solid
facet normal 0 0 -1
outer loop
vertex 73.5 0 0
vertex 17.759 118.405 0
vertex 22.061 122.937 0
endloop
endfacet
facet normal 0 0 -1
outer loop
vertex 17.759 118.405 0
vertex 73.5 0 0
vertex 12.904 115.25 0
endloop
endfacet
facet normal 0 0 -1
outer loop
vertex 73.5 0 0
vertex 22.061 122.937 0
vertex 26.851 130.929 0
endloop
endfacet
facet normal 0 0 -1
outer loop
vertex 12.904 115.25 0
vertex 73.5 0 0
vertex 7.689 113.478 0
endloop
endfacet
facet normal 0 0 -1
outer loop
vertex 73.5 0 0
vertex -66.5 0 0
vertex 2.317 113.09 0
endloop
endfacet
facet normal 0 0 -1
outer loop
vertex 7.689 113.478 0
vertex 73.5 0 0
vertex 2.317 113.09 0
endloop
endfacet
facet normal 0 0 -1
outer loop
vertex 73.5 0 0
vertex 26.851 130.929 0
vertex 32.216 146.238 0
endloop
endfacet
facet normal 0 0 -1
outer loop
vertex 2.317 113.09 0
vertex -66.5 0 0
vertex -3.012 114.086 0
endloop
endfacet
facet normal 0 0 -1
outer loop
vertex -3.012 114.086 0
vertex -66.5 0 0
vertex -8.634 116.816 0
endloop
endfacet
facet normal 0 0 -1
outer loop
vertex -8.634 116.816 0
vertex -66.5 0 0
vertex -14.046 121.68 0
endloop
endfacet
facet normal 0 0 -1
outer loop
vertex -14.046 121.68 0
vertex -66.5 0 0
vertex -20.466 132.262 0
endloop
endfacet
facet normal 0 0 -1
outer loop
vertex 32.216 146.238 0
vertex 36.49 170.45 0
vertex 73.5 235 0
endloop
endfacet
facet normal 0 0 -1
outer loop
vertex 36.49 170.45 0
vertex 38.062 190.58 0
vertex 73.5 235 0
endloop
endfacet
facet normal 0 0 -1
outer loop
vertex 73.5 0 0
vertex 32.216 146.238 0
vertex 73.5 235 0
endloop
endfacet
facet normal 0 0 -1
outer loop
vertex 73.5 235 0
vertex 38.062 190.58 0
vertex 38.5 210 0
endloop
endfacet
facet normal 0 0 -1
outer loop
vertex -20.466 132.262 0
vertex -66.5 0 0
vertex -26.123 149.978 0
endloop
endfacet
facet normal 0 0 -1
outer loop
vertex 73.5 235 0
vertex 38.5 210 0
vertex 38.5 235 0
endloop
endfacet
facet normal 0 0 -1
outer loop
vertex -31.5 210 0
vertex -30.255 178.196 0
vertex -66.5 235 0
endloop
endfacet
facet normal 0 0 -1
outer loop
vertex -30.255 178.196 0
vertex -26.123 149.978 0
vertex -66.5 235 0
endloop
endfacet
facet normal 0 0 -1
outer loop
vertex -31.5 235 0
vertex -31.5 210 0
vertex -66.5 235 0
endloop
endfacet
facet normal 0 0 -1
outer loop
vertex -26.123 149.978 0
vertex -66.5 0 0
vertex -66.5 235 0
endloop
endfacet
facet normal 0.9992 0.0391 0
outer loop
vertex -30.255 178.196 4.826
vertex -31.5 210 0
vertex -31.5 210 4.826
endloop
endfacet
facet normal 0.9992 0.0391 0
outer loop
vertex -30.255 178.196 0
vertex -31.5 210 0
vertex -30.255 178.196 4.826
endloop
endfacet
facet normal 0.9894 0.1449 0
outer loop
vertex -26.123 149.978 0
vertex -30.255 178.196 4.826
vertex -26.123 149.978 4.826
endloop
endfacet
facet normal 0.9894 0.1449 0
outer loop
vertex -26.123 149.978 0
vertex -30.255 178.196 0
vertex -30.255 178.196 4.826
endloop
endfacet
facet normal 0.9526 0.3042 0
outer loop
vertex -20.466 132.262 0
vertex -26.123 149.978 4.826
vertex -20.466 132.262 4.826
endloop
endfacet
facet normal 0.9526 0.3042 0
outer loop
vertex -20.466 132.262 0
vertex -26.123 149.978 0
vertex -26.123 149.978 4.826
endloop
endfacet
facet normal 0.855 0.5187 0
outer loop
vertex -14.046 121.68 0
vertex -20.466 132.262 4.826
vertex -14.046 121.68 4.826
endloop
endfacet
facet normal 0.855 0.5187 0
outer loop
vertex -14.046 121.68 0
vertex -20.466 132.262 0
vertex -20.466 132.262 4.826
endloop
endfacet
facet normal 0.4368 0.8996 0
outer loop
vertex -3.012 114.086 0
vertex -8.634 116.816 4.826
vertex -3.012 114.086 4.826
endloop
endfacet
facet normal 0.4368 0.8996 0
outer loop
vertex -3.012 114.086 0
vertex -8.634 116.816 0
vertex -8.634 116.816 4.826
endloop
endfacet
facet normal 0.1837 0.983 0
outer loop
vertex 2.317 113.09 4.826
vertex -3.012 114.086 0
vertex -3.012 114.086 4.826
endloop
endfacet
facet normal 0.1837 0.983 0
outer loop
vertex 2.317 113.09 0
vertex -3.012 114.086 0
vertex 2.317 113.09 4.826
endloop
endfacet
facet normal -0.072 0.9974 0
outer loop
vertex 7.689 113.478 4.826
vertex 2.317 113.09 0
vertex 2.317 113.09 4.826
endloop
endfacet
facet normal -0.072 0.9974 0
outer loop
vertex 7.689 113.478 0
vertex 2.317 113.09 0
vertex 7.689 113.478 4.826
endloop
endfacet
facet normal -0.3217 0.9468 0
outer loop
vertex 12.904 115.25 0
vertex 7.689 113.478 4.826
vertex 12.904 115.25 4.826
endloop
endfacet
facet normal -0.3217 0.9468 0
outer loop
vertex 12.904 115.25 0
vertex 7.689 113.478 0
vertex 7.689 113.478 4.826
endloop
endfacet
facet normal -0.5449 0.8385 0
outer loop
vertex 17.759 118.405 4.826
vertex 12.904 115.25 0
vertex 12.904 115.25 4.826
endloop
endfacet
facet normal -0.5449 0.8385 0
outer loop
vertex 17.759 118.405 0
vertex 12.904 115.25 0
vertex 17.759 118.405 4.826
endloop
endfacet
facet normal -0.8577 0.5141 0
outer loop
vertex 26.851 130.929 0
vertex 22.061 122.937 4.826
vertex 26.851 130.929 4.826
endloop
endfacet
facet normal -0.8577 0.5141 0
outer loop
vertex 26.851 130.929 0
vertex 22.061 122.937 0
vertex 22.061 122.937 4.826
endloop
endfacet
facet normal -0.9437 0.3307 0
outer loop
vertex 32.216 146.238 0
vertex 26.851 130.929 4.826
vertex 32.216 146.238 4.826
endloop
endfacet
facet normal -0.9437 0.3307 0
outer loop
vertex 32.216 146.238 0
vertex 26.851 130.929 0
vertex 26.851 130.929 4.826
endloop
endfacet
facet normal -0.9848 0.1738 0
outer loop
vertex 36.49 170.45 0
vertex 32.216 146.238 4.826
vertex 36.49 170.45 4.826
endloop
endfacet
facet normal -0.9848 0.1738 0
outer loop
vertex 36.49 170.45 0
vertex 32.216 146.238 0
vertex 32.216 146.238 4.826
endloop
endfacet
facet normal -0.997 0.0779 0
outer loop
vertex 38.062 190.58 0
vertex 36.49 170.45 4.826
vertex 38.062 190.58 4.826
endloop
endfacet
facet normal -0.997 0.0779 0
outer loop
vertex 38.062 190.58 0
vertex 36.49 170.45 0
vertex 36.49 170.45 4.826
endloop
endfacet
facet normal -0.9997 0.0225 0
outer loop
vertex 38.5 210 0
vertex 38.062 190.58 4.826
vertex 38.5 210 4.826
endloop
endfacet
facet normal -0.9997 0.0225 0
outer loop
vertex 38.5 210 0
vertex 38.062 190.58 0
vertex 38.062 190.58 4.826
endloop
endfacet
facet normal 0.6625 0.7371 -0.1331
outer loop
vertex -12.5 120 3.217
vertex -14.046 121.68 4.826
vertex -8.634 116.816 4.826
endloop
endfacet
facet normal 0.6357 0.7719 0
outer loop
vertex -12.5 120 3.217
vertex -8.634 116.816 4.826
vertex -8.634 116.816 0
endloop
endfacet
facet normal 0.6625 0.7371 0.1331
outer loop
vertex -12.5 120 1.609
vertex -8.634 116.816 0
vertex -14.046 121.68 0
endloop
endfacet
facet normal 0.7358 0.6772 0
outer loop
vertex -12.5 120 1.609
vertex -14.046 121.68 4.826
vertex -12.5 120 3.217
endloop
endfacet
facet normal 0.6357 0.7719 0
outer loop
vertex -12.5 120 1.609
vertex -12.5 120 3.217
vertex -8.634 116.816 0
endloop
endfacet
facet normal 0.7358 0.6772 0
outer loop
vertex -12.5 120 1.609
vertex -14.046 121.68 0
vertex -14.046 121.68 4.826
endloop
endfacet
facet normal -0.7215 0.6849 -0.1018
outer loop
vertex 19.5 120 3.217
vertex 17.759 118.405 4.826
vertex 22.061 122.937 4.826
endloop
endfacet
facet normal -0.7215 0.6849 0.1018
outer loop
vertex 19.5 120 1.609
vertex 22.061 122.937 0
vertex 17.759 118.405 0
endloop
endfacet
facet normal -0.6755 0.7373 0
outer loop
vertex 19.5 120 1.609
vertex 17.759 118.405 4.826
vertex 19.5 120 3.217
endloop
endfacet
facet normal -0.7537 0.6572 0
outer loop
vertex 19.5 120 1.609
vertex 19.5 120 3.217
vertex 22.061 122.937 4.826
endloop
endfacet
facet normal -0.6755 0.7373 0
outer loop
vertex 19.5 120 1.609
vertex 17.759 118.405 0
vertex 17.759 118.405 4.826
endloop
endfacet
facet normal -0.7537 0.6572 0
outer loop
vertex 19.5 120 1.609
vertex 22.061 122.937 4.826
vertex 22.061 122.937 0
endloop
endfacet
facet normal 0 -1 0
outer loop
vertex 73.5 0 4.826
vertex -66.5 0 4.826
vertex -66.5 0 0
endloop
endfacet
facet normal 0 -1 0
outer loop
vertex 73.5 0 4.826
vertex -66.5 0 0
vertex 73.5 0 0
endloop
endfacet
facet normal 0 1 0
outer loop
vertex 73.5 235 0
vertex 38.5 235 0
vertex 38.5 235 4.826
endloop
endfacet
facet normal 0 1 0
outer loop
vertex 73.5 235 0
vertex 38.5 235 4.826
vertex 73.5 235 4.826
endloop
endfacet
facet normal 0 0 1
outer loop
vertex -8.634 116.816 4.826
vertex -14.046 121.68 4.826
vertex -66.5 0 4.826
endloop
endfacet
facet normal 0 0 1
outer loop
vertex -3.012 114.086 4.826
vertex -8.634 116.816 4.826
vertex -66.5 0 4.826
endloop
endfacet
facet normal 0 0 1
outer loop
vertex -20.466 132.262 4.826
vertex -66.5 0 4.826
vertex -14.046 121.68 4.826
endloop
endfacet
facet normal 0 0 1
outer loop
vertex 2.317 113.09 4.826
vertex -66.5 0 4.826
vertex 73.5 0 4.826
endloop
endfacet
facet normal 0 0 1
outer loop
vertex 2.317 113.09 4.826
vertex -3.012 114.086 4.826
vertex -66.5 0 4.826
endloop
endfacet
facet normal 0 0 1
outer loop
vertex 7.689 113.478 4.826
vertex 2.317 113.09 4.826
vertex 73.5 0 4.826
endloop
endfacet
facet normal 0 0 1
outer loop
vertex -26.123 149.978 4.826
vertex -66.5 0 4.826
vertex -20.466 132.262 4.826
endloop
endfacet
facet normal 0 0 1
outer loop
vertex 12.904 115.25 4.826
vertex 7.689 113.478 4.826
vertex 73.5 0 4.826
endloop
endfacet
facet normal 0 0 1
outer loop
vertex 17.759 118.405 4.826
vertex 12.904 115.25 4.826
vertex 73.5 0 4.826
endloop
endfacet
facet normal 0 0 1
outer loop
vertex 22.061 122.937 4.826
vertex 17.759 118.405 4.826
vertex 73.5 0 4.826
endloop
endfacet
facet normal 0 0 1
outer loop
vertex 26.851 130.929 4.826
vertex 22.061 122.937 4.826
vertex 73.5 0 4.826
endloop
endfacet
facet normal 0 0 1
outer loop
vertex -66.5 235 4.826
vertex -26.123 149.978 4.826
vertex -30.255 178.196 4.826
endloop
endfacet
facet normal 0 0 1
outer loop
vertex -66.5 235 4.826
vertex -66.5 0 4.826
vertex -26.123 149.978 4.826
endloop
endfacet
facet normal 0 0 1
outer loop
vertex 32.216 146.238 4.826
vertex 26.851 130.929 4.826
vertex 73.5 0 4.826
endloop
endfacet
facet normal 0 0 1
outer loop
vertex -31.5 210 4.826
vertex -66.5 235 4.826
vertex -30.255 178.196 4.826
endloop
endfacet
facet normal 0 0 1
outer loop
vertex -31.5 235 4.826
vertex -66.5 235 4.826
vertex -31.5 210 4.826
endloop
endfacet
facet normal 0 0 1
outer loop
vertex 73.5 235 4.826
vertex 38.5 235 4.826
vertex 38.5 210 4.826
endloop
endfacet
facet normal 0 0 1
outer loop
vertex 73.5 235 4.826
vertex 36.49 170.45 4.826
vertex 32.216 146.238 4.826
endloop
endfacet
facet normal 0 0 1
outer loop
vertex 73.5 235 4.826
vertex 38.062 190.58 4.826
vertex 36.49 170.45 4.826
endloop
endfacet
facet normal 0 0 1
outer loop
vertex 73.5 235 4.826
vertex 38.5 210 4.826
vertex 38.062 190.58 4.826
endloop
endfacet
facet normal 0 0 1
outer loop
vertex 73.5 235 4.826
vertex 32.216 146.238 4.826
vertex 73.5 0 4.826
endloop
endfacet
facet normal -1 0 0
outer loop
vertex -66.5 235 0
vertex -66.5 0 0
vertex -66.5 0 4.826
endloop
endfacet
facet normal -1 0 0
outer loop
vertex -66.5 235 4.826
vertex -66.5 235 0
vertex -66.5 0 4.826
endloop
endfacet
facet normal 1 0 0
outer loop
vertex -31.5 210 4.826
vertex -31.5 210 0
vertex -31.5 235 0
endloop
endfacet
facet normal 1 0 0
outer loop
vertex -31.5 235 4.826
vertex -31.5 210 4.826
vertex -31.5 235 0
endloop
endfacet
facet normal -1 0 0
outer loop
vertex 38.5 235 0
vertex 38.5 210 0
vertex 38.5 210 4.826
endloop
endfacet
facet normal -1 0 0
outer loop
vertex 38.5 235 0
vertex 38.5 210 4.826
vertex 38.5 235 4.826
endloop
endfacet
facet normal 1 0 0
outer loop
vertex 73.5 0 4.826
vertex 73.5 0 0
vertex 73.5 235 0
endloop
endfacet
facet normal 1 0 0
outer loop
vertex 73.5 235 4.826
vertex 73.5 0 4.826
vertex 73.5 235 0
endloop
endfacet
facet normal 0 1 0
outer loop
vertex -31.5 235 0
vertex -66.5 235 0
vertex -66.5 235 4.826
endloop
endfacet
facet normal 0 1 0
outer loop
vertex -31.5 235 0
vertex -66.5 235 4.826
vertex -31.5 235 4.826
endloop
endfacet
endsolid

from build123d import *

# Parameters (mm, degrees)
F0_W      = 140
F0_H      = 110
F0_W_2    = 35
F0_H_2    = 25
F1_DEPTH  = 4.826
F2_W      = 31.75
F2_H      = 31.75
F2_W_2    = 25.4
F2_H_2    = 25.4
F3_DEPTH  = 120
F4_W      = 6
F4_H      = 31.75
F4_W_2    = 2.825
F4_H_2    = 25.4
F5_DEPTH  = 110
F6_R      = 3
F7_DEPTH  = 10
F8_W      = 25.4
F8_H      = 25.4
F8_W_2    = 15.874
F8_H_2    = 15.874
F9_DEPTH  = 20
F11_DEPTH = 152
F12_W     = 120
F12_H     = 31.75
F13_DEPTH = 140.0010001


with BuildPart() as f1:
    # F0 (on Top) → F1 (new body)
    with BuildSketch(Plane.XY):
        with Locations((3.5, 55)):
            Rectangle(F0_W, F0_H)
        with BuildLine():
            Line((-66.5, 210), (-66.5, 110))
            Line((-66.5, 110), (73.5, 110))
            Line((73.5, 110), (73.5, 210))
            Line((73.5, 210), (38.5, 210))
            add(Edge.make_bspline(
                [(-31.5, 210), (-31.5, 178), (-26.1927577262, 110.7427430843), (33.1927577262, 110.7427430843), (38.5, 178), (38.5, 210)],
                knots=[0, 0, 0, 0, 0.3861272069, 0.6138727931, 1, 1, 1, 1], degree=3))
            Line((-31.5, 210), (-66.5, 210))
        make_face()
        with Locations((-49, 222.5)):
            Rectangle(F0_W_2, F0_H_2)
        with Locations((56, 222.5)):
            Rectangle(F0_W_2, F0_H_2)
    extrude(amount=F1_DEPTH)

    # F2 (on face) → F3 (join)
    with BuildSketch(Plane.XZ):
        with Locations((-50.625, -15.875)):
            Rectangle(F2_W, F2_H)
        with Locations((-50.625, -15.875)):
            Rectangle(F2_W_2, F2_H_2, mode=Mode.SUBTRACT)
        with Locations((57.625, -15.875)):
            Rectangle(F2_W, F2_H)
        with Locations((57.625, -15.875)):
            Rectangle(F2_W_2, F2_H_2, mode=Mode.SUBTRACT)
    extrude(amount=-F3_DEPTH)

    # F4 (on face) → F5 (join)
    with BuildSketch(Plane(origin=(0, 120, 0), x_dir=(-1, 0, 0), z_dir=(0, 1, 0))):
        with Locations((63.5, -15.875)):
            Rectangle(F4_W, F4_H)
        with Locations((-68.9125, -15.875)):
            Rectangle(F4_W_2, F4_H_2)
        Polygon((-67.5, 0), (-73.5, 0), (-73.5, -31.75), (-70.325, -31.75), (-67.5, -31.75), (-67.5, -28.575), (-70.325, -28.575), (-70.325, -3.175), (-67.5, -3.175), align=None)
    extrude(amount=F5_DEPTH)

    # F6 (on face) → F7 (cut)
    with BuildSketch(Plane.YZ.offset(-34.75)):
        with Locations((60, -10)):
            Circle(F6_R)
    extrude(amount=-F7_DEPTH, mode=Mode.SUBTRACT)

    # F8 (on face) → F9 (join, symmetric)
    with BuildSketch(Plane.XZ):
        with Locations((-50.625, -15.875)):
            Rectangle(F8_W, F8_H)
        with Locations((-50.625, -15.875)):
            Rectangle(F8_W_2, F8_H_2, mode=Mode.SUBTRACT)
        with Locations((57.625, -15.875)):
            Rectangle(F8_W, F8_H)
        with Locations((57.625, -15.875)):
            Rectangle(F8_W_2, F8_H_2, mode=Mode.SUBTRACT)
    extrude(amount=F9_DEPTH, both=True)

    # F10 (on face) → F11 (cut)
    with BuildSketch(Plane(origin=(-66.5, 0, 0), x_dir=(0, -1, 0), z_dir=(-1, 0, 0))):
        with BuildLine():
            ThreePointArc((-180, -20), (-177.1715728753, -18.8284271247), (-176, -16))
            ThreePointArc((-176, -16), (-177.1715728753, -13.1715728753), (-180, -12))
            Line((-180, -12), (-180, -16))
            Line((-180, -16), (-180, -20))
        make_face()
        with BuildLine():
            Line((-180, -16), (-180, -12))
            ThreePointArc((-180, -12), (-184, -16), (-180, -20))
            Line((-180, -20), (-180, -16))
        make_face()
        with BuildLine():
            ThreePointArc((-180, -20), (-184, -16), (-180, -12))
            Line((-180, -12), (-230, -12))
            Line((-230, -12), (-230, -20))
            Line((-230, -20), (-180, -20))
        make_face()
    extrude(amount=-F11_DEPTH, mode=Mode.SUBTRACT)

    # F12 (on face) → F13 (cut, through all)
    with BuildSketch(Plane(origin=(-66.5, 0, 0), x_dir=(0, -1, 0), z_dir=(-1, 0, 0))):
        Polygon((-236.2957447767, 41.7925678194), (-236.2957447767, 0), (-235, 0), (-235, 4.826), (-120, 4.826), (-120, 41.7925678194), align=None)
        Polygon((-120, 64.1580745578), (-120, 41.7925678194), (11.4044835791, 41.7925678194), (11.4044835791, 0), (0, 0), (0, -31.75), (-120, -31.75), (-120, -61.878118664), (43.3997410536, -61.878118664), (43.3997410536, 64.1580745578), align=None)
        with Locations((-60, -15.875)):
            Rectangle(F12_W, F12_H)
        Polygon((11.4044835791, 41.7925678194), (-120, 41.7925678194), (-120, 4.826), (0, 4.826), (0, 0), (11.4044835791, 0), align=None)
        with BuildLine():
            Line((-120, 0), (-230, 0))
            Line((-230, 0), (-230, -12))
            Line((-230, -12), (-180, -12))
            ThreePointArc((-180, -12), (-176, -16), (-180, -20))
            Line((-180, -20), (-230, -20))
            Line((-230, -20), (-230, -31.75))
            Line((-230, -31.75), (-120, -31.75))
            Line((-120, -31.75), (-120, 0))
        make_face()
    extrude(amount=-F13_DEPTH, mode=Mode.SUBTRACT)


solid = f1.part
